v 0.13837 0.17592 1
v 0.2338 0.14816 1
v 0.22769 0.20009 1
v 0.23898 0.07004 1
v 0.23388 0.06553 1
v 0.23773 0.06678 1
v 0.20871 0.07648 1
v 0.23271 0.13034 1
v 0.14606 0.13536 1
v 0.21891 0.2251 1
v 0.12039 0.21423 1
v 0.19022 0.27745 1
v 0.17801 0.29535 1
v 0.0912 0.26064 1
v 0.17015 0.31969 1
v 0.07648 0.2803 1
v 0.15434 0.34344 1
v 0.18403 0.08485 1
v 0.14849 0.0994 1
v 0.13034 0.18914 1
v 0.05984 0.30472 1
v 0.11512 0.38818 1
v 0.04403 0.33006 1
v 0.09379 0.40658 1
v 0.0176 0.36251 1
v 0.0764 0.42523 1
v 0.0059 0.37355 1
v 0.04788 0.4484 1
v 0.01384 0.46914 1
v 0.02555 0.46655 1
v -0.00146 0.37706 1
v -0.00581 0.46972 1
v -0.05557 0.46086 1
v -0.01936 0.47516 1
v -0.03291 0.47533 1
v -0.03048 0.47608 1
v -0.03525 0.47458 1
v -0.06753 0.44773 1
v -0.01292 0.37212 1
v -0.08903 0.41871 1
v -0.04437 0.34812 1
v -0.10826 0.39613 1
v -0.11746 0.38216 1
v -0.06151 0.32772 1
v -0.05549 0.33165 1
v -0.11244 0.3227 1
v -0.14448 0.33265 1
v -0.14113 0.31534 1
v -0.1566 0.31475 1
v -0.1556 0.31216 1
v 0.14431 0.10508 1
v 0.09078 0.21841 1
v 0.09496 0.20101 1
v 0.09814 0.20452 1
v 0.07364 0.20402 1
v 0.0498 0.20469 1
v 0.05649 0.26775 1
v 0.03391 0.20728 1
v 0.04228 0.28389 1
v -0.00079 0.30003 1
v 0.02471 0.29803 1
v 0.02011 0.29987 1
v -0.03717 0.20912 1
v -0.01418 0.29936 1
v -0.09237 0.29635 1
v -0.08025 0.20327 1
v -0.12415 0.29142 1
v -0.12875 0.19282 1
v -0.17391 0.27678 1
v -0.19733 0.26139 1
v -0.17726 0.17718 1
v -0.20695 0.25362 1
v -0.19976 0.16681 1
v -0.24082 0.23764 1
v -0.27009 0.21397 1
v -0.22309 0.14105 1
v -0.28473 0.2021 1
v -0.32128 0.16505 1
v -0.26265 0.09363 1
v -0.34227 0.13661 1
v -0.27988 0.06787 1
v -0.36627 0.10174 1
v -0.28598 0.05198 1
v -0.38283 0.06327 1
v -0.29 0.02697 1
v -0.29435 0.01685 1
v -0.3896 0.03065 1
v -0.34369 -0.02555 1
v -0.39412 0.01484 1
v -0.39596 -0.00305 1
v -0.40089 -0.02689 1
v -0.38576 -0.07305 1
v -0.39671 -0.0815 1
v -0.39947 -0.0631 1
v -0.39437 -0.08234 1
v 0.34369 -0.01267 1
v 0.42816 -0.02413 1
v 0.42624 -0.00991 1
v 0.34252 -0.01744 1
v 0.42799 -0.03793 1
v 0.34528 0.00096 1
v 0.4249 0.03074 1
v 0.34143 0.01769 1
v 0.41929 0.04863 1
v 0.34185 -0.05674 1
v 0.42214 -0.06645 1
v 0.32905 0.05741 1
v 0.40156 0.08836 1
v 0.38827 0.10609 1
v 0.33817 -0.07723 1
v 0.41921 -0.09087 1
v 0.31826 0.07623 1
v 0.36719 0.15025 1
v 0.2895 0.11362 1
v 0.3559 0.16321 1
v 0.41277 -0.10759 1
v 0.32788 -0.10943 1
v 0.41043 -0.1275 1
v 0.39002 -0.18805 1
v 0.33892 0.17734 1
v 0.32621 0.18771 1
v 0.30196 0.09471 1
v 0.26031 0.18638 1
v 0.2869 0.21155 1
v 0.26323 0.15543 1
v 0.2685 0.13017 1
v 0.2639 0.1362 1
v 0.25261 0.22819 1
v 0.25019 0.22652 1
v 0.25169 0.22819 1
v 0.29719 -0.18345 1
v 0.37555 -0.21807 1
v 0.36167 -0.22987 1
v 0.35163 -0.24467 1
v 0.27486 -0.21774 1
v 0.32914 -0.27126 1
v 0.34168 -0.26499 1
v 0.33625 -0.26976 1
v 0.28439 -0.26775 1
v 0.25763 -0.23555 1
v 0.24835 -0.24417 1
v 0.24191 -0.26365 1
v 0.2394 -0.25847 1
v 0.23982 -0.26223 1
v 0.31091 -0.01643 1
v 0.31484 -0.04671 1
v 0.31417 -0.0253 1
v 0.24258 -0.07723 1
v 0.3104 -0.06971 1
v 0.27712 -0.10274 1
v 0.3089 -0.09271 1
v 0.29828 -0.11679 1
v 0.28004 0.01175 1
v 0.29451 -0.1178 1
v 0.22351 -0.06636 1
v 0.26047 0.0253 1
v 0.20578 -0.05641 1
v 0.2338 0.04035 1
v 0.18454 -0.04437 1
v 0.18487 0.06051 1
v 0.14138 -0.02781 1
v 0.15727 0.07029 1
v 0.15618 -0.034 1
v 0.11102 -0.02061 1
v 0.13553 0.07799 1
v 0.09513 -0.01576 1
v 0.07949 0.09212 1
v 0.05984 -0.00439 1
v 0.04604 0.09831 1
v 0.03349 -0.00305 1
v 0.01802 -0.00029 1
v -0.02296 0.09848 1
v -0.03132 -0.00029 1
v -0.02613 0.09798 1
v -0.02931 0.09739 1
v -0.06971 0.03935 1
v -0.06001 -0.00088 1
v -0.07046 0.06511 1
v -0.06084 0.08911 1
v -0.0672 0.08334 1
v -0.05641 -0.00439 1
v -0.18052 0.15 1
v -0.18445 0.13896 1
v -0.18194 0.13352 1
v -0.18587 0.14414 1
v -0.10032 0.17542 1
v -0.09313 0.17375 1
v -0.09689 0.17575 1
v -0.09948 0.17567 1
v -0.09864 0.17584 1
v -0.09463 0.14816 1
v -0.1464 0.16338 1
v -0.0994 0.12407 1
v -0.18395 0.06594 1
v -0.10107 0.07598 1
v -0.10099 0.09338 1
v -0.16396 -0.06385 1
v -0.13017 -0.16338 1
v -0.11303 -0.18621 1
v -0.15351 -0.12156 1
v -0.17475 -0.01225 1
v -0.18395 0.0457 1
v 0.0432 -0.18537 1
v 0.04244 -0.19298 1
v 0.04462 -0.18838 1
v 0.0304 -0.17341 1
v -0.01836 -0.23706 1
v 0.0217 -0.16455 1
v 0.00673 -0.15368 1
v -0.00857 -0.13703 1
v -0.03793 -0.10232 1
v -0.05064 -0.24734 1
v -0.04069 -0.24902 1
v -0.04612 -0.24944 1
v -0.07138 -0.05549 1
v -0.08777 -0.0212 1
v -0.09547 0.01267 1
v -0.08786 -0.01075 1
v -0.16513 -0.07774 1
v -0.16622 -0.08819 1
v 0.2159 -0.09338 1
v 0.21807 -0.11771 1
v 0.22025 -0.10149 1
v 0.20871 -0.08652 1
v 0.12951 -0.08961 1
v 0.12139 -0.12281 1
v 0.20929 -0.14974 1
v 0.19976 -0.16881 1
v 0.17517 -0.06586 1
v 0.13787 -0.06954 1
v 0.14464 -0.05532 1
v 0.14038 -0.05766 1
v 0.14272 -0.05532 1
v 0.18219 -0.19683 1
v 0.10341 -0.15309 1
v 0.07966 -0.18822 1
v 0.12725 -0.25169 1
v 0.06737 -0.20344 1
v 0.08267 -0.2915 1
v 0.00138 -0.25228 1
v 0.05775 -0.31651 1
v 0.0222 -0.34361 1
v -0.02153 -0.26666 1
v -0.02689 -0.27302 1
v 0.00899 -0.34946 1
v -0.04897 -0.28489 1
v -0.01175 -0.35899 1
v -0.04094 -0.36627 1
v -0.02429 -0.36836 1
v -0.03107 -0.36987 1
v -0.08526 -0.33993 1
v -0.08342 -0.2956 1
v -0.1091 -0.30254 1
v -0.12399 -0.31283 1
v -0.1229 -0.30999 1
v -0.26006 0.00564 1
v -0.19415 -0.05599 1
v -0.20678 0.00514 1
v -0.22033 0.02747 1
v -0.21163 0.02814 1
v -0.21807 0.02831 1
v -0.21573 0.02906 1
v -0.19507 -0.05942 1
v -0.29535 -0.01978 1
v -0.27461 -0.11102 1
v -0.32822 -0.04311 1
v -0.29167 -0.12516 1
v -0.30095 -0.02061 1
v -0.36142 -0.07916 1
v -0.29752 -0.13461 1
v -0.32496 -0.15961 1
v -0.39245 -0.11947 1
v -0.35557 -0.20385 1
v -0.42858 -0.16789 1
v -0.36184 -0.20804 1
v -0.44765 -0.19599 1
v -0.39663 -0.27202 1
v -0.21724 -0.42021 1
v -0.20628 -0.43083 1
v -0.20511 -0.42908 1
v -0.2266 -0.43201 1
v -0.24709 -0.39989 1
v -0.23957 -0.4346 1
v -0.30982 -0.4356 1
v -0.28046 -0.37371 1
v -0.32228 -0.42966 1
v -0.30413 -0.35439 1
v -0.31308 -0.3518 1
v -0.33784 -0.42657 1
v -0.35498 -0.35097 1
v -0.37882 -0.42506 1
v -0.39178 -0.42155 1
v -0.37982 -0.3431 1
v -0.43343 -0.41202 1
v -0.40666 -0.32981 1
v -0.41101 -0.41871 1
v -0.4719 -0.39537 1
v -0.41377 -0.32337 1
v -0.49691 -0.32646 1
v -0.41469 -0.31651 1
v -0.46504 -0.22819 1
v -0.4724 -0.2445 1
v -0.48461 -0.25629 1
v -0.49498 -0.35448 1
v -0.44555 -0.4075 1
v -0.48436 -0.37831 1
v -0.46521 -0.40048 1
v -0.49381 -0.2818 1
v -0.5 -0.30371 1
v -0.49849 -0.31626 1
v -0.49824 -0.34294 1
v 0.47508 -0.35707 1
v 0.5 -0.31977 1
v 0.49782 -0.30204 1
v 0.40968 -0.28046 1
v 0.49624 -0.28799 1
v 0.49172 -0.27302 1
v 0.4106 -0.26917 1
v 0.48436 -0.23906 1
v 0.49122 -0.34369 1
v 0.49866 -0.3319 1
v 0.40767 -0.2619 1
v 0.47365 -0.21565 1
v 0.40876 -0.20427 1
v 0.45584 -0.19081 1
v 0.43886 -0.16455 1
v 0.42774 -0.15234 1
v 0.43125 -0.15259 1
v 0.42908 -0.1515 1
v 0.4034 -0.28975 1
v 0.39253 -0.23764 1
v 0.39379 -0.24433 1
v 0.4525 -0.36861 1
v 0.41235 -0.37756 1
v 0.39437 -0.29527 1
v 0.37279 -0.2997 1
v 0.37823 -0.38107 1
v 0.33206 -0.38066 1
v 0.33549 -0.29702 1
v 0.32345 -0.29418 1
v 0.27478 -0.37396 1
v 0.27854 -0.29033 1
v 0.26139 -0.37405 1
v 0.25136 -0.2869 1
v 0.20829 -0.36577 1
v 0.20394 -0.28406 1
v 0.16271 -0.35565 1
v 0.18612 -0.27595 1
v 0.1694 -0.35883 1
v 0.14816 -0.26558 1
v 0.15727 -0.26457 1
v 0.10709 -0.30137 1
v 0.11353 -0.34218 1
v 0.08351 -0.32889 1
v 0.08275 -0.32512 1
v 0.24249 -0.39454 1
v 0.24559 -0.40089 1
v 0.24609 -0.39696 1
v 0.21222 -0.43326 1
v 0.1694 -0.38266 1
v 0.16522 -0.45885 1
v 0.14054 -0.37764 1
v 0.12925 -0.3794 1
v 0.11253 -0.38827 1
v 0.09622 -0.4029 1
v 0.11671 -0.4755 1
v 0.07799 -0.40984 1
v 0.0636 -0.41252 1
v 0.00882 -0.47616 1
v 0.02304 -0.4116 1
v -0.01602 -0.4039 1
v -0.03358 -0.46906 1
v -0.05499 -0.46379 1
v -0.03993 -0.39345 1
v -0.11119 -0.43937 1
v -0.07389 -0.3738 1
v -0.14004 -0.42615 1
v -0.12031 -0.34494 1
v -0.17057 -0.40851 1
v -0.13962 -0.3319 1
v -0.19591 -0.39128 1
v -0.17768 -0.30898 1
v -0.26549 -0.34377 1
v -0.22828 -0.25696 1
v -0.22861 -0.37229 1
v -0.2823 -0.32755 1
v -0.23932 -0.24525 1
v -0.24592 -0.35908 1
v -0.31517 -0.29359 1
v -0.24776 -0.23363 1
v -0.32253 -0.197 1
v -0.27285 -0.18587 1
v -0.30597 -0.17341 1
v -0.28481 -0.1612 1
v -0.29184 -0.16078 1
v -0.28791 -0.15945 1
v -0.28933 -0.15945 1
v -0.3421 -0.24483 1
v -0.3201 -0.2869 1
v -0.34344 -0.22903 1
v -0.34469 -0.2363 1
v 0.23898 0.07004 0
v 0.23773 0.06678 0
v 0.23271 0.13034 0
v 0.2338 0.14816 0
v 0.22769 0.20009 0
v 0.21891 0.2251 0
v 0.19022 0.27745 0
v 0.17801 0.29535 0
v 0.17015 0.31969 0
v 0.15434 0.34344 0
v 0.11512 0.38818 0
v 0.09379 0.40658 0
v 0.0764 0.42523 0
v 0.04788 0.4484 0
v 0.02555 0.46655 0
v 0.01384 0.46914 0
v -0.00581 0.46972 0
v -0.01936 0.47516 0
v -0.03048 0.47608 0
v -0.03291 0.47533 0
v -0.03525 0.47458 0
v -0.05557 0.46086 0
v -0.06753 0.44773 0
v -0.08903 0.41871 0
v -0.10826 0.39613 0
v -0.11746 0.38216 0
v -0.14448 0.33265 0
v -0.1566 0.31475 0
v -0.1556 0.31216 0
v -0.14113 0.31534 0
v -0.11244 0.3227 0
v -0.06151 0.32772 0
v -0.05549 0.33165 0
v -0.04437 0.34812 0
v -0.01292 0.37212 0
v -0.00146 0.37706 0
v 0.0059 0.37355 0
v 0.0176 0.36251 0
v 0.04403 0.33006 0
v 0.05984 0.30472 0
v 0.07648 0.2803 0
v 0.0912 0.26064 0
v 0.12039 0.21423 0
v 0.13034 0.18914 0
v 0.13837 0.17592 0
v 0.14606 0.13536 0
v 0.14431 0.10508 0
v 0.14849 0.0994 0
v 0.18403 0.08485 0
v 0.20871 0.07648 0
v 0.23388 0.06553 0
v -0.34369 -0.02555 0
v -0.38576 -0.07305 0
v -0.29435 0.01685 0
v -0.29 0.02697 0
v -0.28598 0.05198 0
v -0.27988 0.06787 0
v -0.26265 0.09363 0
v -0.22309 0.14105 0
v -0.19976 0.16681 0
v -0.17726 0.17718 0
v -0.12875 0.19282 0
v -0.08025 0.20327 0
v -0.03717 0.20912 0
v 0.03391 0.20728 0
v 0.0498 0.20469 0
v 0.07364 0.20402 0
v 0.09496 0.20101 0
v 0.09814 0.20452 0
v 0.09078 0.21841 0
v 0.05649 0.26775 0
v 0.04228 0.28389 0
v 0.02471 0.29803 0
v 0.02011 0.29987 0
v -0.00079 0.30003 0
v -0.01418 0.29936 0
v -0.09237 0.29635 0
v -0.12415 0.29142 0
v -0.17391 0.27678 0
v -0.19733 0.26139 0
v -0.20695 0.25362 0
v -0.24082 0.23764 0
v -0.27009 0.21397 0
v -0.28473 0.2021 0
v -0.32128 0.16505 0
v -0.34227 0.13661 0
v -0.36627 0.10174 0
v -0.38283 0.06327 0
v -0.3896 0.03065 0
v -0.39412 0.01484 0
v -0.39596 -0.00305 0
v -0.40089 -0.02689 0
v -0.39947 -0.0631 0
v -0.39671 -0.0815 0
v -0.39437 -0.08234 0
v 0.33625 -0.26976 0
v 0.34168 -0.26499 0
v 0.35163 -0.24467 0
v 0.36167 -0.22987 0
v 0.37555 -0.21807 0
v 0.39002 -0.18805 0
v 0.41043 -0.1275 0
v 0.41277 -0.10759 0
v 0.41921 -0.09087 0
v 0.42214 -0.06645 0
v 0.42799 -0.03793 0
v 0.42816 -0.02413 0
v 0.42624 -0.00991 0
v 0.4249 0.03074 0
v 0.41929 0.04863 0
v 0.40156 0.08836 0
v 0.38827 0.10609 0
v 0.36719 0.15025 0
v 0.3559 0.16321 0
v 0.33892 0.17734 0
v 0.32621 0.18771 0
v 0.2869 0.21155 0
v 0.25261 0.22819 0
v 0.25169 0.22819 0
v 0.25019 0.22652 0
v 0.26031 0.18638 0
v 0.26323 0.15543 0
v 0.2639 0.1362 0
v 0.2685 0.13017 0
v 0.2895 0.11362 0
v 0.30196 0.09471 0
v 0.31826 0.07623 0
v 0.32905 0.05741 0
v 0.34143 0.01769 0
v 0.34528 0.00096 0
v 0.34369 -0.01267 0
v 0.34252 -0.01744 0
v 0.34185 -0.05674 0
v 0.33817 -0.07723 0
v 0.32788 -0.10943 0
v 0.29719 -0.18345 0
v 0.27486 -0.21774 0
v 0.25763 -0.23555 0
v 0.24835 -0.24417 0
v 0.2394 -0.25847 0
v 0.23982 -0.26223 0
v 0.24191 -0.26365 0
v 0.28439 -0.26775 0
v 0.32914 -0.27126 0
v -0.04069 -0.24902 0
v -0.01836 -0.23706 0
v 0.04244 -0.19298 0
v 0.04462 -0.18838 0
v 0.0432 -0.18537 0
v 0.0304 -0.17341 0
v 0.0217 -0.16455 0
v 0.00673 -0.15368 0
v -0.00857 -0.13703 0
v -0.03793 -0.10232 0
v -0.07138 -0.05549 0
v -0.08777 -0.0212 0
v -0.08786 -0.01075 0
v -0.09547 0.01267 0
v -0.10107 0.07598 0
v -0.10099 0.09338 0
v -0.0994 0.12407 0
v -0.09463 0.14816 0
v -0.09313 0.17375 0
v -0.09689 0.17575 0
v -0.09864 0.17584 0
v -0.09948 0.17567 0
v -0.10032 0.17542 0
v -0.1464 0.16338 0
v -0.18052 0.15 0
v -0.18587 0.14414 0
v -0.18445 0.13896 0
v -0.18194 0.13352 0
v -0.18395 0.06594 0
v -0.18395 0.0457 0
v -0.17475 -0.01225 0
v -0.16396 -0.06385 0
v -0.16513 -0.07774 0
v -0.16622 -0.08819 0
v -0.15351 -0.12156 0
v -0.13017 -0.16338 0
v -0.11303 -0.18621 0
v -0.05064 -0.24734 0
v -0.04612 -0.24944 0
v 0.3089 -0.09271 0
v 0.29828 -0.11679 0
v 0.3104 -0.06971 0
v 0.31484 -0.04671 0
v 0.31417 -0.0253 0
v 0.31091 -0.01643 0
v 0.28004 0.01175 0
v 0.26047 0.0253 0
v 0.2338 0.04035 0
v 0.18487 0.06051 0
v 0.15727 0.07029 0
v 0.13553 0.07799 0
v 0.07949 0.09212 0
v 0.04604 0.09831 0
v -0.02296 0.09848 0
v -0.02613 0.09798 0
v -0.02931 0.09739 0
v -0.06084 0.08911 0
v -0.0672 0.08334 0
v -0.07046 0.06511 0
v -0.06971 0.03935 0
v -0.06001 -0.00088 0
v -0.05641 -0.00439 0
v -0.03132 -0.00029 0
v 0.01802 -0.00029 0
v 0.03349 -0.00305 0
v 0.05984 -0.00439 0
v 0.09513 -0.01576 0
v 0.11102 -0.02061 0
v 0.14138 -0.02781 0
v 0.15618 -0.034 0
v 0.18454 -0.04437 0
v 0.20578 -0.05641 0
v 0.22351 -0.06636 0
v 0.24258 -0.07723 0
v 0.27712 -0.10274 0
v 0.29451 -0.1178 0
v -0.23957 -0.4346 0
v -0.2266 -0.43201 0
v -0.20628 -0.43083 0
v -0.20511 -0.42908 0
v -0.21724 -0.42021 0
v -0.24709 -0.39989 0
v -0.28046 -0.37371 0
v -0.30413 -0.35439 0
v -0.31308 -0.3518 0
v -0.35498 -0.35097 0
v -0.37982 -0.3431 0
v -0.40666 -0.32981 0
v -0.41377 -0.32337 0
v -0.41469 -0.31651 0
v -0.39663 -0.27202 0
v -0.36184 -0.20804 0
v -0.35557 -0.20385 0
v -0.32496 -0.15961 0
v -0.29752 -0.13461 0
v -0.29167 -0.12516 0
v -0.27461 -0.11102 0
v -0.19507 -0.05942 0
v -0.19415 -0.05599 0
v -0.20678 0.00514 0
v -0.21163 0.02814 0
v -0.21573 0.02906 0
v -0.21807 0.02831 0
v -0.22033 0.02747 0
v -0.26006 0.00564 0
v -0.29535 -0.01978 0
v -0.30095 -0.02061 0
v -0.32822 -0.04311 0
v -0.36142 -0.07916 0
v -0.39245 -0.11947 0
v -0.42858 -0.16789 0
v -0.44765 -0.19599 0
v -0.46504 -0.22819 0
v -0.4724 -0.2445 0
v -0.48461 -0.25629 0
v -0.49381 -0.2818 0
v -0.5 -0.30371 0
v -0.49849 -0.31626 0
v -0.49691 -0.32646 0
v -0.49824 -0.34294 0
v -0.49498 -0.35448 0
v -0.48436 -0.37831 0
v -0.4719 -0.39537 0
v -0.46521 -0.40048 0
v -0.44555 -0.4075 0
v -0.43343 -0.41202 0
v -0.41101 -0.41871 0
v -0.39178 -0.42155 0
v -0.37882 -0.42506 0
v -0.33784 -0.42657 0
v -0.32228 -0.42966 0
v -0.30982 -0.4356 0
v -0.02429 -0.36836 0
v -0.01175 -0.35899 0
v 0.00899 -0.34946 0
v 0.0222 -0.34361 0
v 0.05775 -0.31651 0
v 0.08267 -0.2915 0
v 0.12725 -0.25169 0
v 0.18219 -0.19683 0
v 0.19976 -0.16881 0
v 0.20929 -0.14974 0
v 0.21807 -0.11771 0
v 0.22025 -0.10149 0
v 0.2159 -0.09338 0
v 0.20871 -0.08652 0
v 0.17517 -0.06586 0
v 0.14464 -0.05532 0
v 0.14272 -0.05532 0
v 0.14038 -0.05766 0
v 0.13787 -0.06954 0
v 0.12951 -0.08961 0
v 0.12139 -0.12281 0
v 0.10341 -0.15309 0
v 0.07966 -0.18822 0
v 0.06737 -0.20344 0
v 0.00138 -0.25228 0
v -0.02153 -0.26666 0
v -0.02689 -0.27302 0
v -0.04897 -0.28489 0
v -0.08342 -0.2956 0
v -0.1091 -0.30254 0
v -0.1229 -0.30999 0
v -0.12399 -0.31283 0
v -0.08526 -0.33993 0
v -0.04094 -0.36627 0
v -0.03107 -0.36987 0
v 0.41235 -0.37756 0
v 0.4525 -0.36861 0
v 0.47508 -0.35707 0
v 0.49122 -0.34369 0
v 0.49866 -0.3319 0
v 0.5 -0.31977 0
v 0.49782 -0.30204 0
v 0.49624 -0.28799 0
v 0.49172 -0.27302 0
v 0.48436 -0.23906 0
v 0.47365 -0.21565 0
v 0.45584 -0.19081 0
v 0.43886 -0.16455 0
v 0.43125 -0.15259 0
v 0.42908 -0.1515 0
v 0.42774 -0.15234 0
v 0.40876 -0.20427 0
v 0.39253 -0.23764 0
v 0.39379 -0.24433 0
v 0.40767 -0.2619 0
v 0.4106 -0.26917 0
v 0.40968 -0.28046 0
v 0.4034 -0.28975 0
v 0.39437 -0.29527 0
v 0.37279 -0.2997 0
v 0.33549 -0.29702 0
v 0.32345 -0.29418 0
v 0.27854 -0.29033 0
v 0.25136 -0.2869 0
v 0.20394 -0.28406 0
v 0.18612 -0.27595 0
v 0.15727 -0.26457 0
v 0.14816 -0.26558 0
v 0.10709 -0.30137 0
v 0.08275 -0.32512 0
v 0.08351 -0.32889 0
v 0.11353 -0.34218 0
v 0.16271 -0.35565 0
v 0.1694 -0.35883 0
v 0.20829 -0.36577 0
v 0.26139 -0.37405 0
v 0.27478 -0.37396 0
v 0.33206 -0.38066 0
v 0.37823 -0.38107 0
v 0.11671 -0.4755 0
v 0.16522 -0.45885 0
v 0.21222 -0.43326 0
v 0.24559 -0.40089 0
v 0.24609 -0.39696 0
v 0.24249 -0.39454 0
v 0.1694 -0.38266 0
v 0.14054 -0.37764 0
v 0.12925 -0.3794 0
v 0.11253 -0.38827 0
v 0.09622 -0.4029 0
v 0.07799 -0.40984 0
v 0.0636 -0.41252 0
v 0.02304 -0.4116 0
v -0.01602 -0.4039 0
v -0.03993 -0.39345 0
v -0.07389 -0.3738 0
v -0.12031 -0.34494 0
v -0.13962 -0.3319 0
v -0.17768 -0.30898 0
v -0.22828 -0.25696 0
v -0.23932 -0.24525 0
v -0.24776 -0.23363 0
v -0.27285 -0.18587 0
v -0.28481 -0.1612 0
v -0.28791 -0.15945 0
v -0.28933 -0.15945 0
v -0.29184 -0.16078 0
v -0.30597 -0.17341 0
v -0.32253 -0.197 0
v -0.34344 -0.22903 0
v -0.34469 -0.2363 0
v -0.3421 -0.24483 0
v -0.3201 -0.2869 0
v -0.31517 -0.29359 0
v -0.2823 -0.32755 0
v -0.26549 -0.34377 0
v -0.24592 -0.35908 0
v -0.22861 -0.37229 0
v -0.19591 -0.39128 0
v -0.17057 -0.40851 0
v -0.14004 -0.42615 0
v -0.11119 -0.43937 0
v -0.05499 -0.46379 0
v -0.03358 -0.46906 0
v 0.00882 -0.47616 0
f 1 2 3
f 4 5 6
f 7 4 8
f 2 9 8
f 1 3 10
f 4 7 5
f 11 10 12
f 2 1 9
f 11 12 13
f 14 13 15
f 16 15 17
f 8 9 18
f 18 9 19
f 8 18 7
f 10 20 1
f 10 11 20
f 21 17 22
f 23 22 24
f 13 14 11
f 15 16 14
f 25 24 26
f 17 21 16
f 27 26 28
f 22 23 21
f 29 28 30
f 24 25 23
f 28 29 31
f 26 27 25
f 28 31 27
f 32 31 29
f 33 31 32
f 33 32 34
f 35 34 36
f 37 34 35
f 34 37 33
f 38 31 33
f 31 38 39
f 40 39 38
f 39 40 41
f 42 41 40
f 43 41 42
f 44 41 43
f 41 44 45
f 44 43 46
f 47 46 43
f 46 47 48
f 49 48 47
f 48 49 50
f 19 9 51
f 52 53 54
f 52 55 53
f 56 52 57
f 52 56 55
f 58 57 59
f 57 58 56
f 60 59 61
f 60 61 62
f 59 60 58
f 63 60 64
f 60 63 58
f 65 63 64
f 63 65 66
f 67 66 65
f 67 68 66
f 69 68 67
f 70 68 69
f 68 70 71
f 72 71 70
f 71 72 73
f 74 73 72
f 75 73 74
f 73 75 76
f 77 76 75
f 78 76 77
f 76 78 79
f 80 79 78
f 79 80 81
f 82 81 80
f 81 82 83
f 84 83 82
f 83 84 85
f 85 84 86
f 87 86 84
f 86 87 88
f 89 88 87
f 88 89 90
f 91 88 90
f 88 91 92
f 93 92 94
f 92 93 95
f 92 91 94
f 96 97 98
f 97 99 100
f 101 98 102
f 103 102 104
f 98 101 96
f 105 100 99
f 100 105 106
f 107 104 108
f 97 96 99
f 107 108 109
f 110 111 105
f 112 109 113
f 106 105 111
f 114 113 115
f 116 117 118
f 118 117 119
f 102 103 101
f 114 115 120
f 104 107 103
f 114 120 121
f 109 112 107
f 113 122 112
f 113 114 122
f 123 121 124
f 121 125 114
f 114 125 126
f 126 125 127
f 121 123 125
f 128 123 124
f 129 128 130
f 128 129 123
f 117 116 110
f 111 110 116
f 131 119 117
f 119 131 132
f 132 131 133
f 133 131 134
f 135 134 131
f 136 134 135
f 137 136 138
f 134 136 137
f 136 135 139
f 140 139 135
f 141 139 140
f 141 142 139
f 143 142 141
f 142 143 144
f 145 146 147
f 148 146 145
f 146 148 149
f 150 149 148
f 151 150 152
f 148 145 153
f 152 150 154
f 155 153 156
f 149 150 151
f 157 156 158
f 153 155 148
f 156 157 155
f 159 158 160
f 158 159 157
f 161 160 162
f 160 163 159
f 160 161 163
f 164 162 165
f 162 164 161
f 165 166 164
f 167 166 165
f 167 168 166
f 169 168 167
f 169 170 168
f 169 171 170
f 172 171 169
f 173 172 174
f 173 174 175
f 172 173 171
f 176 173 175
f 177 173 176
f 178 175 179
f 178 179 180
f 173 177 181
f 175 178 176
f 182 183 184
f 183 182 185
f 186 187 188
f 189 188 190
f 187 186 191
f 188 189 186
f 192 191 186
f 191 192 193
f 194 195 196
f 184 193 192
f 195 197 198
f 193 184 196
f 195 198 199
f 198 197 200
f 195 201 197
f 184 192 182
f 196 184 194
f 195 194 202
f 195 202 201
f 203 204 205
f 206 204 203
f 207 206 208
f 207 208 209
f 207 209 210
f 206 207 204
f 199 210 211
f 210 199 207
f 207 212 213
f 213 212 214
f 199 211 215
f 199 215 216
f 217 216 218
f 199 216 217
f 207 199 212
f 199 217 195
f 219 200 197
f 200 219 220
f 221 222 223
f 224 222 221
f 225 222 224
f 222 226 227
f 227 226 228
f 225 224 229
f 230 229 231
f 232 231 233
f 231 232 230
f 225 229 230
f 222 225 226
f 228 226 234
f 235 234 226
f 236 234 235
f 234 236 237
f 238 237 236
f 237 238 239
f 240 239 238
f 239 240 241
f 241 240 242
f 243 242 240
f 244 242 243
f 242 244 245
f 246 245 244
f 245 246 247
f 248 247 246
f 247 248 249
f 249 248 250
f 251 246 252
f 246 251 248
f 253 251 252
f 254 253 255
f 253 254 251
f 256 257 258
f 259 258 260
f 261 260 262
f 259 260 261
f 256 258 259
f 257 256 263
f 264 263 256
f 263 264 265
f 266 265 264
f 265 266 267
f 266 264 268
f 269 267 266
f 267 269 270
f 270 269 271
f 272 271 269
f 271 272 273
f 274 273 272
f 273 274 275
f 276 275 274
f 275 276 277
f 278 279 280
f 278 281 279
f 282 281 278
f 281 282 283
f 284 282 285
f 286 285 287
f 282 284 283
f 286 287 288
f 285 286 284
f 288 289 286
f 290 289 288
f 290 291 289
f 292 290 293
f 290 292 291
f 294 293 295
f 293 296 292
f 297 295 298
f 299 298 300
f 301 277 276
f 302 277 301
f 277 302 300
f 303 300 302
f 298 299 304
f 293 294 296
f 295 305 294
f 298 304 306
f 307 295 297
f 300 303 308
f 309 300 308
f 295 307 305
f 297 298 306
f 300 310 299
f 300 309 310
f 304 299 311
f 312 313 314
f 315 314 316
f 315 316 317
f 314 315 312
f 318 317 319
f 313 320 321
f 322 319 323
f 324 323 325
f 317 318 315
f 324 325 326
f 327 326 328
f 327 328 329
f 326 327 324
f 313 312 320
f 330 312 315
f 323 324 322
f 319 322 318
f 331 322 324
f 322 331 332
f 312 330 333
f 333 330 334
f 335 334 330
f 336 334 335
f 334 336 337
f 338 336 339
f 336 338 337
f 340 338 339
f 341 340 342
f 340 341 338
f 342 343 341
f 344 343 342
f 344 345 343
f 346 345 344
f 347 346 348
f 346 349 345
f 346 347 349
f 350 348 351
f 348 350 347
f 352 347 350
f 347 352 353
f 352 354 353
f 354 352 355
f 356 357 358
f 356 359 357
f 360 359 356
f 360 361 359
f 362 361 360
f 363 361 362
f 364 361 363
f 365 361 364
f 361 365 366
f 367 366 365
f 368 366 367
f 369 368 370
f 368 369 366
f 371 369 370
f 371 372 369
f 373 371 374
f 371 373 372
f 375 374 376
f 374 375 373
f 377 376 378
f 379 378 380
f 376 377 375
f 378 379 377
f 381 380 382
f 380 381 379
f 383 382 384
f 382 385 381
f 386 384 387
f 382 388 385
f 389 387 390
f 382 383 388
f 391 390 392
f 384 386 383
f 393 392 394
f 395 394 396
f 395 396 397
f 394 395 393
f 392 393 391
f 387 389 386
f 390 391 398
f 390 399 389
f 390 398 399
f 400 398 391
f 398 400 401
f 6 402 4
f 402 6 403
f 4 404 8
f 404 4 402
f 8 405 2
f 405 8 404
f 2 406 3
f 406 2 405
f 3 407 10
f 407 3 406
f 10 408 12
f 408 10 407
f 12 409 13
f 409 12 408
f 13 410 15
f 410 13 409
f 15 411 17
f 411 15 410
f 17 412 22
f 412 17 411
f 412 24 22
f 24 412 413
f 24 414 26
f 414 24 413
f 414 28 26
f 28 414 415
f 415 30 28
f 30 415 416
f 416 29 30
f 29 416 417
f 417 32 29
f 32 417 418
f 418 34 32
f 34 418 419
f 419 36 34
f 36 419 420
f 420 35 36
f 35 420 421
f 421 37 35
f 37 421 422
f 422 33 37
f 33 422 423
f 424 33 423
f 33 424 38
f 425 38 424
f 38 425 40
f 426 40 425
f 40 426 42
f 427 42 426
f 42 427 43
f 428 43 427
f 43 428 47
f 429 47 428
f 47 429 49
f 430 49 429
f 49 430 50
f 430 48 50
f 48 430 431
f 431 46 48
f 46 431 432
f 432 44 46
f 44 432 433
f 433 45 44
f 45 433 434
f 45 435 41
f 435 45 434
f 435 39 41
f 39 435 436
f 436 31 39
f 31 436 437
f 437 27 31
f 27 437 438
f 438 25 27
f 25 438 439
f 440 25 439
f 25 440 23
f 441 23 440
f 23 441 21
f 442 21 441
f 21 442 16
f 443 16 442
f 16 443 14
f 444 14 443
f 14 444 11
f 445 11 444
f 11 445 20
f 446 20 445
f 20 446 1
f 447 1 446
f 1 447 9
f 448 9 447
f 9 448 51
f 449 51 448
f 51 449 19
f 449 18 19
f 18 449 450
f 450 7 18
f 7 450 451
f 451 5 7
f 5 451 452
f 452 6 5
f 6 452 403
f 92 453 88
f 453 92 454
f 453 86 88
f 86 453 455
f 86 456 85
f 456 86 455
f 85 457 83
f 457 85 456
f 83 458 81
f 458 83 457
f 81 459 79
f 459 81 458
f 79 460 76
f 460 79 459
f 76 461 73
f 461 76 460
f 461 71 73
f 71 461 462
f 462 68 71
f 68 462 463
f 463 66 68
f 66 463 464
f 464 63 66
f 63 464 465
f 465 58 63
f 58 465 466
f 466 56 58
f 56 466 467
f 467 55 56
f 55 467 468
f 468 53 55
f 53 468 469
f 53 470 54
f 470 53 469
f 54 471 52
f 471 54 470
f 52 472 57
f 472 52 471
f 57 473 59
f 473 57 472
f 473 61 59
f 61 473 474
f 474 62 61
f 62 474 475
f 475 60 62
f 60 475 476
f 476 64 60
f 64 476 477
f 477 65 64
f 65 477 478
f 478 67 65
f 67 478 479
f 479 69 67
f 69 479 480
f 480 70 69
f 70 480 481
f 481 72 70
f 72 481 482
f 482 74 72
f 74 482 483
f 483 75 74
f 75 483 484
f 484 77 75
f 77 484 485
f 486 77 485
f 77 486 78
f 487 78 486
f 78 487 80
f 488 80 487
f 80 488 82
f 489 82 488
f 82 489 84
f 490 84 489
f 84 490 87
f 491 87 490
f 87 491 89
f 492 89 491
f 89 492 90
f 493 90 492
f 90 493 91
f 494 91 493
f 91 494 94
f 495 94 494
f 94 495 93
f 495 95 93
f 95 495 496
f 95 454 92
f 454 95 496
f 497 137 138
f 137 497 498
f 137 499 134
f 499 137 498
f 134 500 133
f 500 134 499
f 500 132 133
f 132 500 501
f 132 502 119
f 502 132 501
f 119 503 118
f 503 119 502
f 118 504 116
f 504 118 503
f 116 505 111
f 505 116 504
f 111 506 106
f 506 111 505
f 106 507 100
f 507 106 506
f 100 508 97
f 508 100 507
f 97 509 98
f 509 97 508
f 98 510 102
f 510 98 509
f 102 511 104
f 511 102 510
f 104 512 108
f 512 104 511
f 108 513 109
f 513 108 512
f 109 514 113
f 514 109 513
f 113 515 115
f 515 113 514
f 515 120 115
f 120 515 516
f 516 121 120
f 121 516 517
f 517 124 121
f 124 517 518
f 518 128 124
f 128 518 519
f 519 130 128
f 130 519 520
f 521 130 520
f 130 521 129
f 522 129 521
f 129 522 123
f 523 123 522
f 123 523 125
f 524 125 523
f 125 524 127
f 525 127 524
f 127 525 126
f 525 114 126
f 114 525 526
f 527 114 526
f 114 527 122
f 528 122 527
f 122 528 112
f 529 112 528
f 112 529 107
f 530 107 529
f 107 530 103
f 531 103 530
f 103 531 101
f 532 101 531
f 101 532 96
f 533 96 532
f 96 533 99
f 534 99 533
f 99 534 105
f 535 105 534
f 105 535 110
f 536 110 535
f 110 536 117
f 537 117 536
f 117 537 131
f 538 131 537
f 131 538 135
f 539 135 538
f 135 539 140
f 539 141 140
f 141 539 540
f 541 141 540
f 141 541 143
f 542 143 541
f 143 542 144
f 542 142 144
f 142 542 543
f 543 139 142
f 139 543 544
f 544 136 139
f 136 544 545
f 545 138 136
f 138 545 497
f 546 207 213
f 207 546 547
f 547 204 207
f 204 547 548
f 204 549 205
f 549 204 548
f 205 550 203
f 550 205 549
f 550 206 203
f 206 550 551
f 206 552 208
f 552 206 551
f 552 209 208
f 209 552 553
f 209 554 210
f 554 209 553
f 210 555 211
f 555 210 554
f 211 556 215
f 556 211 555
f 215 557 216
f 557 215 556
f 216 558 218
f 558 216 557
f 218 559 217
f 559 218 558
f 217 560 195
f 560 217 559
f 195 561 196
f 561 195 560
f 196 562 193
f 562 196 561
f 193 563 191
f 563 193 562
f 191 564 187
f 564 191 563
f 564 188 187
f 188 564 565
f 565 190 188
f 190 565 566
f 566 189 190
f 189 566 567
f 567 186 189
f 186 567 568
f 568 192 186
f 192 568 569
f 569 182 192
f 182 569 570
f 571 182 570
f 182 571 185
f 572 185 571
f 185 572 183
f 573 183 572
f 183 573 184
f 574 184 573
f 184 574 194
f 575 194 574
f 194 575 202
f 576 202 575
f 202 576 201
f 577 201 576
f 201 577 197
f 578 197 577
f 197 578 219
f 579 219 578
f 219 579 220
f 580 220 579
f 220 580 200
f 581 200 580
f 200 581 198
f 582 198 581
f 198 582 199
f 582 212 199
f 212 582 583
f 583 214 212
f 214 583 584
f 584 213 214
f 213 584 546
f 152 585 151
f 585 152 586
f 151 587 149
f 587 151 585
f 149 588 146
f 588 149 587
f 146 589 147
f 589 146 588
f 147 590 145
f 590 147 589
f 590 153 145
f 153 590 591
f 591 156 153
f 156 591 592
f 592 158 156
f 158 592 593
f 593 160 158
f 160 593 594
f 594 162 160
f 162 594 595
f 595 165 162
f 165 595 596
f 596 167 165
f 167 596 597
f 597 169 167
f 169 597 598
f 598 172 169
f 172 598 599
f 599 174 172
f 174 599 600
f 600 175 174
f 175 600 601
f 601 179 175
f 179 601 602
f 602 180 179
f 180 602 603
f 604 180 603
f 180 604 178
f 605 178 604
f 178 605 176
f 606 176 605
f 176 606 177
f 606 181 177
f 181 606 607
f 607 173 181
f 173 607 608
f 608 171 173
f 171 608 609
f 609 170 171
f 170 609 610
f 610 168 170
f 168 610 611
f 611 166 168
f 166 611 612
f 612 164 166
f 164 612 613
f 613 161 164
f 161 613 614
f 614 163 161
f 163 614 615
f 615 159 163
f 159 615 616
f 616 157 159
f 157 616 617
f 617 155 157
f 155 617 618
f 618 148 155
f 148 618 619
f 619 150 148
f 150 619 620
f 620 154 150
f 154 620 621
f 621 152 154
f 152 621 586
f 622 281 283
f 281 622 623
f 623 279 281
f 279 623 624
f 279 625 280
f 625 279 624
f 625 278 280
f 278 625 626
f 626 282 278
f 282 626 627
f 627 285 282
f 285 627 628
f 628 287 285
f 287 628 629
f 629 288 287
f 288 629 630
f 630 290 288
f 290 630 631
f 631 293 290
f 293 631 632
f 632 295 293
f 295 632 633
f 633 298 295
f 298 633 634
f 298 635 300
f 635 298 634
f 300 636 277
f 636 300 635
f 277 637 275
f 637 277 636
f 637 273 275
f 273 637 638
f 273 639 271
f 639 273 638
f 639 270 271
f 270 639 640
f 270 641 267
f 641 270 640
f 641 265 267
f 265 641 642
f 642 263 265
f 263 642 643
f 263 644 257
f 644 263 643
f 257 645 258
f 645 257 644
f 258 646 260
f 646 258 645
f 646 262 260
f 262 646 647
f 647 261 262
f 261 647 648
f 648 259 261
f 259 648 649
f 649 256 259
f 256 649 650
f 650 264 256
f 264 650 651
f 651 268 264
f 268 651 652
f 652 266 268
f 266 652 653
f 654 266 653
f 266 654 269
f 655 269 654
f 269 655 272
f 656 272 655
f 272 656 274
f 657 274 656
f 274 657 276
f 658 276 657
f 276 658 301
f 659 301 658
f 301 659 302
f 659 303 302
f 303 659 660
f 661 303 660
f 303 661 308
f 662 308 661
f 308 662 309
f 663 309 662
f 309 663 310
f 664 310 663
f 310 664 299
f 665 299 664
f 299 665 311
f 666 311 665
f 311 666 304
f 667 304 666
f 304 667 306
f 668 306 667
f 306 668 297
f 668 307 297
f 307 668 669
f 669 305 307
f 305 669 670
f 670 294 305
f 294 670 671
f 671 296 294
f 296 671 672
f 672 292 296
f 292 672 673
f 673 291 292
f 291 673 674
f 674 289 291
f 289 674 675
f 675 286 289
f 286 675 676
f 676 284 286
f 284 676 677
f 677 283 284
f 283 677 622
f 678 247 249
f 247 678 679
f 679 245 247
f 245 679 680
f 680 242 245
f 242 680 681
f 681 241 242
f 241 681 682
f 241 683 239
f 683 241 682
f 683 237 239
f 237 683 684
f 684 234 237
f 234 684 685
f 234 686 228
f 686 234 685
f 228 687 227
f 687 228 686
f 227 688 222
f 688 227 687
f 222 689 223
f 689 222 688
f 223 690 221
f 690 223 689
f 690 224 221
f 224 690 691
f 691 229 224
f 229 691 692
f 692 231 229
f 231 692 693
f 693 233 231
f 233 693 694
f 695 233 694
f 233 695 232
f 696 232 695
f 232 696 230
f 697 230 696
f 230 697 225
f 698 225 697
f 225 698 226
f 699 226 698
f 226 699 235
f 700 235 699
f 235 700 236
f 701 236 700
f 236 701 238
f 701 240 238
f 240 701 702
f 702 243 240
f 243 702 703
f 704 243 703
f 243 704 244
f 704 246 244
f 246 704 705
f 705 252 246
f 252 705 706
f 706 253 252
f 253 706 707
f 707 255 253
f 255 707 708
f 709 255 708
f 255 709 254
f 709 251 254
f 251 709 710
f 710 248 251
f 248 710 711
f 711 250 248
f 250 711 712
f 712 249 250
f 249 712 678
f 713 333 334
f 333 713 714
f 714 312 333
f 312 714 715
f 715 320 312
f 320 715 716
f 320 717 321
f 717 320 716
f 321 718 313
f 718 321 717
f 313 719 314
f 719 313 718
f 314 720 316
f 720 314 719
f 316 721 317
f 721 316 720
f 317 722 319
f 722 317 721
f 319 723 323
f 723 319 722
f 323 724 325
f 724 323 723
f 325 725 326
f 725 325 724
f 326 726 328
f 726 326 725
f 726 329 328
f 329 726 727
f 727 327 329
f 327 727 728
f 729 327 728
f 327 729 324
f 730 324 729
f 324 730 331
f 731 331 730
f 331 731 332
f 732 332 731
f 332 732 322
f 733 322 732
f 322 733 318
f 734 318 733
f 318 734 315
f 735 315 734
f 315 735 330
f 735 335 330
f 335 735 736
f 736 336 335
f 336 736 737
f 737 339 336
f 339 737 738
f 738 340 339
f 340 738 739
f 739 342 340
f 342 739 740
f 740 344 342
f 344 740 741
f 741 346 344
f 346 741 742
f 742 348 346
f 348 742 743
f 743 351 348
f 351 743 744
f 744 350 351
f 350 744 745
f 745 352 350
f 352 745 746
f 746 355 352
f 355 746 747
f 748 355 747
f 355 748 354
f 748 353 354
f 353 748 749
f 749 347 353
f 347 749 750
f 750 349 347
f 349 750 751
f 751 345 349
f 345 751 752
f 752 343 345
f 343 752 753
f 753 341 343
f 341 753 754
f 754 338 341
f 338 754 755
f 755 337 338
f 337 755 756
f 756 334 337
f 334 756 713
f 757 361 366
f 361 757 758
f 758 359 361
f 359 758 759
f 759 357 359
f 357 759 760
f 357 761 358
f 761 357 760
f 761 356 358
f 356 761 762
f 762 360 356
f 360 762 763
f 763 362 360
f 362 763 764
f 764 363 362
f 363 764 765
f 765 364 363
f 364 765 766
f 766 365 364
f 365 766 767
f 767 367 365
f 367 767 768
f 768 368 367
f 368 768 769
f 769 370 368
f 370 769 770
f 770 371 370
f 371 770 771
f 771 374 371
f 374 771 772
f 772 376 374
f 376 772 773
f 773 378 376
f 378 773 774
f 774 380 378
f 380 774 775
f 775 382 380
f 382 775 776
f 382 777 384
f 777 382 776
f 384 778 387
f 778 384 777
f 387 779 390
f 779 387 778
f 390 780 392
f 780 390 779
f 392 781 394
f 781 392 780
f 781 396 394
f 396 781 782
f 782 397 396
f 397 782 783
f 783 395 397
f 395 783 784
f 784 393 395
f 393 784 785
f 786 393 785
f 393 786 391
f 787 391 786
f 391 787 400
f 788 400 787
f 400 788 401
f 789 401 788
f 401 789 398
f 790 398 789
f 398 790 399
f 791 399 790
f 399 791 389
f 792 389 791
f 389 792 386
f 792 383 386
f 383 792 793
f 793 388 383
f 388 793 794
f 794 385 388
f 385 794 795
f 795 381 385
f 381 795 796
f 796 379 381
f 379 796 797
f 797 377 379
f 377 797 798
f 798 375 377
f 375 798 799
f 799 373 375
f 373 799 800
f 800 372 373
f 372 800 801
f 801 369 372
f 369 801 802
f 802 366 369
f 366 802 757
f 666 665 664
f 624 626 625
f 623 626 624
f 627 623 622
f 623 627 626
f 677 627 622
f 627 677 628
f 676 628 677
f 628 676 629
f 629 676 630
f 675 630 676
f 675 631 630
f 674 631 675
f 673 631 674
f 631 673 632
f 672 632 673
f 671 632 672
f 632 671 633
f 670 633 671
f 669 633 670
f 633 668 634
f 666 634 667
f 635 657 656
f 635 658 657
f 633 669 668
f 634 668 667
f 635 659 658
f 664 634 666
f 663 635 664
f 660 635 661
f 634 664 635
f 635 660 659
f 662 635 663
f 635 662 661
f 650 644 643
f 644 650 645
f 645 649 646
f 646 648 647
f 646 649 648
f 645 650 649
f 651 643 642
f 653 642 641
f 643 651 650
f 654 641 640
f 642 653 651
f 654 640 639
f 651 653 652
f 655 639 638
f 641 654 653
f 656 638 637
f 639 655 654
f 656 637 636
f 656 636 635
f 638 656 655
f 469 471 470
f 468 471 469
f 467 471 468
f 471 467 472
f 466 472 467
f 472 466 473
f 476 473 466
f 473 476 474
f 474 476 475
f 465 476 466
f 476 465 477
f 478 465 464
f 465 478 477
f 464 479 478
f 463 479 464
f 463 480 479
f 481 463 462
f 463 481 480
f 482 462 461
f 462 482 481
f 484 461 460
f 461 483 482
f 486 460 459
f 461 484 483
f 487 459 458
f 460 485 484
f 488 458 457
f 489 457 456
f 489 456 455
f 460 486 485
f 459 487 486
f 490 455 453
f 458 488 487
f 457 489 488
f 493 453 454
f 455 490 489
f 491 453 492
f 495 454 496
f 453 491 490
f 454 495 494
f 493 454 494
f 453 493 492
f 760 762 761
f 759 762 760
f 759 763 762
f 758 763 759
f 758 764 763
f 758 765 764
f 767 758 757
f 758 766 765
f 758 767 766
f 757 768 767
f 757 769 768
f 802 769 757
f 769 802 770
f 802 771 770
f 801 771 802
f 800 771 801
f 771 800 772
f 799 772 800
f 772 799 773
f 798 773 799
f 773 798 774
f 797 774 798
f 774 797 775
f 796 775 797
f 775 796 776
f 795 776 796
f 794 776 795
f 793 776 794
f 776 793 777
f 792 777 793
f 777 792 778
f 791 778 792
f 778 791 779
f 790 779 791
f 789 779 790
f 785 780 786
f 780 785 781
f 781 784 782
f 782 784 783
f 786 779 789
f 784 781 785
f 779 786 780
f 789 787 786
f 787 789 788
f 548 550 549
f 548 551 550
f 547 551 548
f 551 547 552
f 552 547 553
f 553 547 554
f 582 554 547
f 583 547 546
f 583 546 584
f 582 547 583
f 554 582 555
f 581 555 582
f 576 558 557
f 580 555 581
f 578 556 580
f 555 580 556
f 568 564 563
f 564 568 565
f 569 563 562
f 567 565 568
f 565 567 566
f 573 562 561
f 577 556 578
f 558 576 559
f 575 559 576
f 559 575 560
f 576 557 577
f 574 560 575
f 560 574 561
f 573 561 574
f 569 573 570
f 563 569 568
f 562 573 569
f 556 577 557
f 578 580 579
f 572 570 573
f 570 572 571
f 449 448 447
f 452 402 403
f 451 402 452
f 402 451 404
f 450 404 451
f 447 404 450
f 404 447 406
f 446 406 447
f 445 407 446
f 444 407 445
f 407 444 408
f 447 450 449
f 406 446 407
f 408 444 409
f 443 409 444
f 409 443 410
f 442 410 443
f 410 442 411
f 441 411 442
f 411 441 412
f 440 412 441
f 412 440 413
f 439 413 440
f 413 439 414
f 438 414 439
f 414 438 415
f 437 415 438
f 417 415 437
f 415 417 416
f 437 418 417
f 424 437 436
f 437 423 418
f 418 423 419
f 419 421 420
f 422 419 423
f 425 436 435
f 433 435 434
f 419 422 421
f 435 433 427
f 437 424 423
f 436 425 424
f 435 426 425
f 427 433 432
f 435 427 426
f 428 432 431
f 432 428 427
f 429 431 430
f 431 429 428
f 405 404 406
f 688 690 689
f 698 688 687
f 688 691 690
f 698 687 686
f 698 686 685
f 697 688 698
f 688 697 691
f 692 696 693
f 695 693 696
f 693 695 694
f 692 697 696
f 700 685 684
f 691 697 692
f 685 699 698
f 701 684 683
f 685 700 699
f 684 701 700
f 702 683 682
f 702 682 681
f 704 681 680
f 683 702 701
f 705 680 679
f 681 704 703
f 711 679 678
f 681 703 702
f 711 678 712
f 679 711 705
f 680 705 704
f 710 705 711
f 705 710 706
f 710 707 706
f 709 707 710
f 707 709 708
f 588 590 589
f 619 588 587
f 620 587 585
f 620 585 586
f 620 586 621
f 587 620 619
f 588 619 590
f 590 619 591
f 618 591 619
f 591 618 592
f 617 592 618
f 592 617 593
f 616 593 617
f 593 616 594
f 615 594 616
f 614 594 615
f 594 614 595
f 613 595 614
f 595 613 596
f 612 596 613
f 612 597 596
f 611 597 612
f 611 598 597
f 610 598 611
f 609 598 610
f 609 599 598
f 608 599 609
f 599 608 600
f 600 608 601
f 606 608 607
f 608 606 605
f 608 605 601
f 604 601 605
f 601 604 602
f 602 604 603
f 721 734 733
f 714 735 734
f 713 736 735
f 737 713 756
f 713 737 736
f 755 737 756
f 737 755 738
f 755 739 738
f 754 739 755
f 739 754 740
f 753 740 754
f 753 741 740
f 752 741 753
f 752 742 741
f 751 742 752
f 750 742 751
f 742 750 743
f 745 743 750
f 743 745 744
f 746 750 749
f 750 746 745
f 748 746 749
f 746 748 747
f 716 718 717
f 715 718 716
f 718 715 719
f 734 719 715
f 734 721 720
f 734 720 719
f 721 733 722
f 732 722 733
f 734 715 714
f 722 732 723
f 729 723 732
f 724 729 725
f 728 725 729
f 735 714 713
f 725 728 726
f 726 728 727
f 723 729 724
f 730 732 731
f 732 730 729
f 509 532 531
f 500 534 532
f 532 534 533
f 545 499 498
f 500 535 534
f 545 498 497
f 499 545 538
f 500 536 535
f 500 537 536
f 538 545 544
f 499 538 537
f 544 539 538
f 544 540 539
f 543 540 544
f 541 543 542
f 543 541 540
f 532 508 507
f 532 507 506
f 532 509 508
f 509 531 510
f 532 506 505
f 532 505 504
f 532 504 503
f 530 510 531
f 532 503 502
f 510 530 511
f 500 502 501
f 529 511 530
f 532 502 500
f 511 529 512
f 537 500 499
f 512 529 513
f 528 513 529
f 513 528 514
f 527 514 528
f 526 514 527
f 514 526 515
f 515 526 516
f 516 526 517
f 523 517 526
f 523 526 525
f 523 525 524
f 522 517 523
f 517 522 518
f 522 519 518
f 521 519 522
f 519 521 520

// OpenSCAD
module guitarPick_1()
{
 /* Generated by trace2scad version 20150415
    http://aggregate.org/MAKE/TRACE2SCAD/
    Optimized model has 406/1933 original points
 */
 color([0.5, 0.5, 0.5])
 assign(minx=4154) /* polygon minx=4154 */
 assign(miny=4168) /* polygon miny=4168 */
 assign(maxx=16111) /* polygon maxx=16111 */
 assign(maxy=15555) /* polygon maxy=15555 */
 assign(dx=maxx-minx)
 assign(dy=maxy-miny)
 assign(maxd=((dx>dy)?dx:dy))
 scale([1/maxd, 1/maxd, 1])
 translate([-minx-dx/2, -miny-dy/2, 0])
 linear_extrude(height=1, convexity=406)
 union() {
  union() {
   polygon([[9739,15545],[9711,15536],[9468,15372],[9325,15215],[9068,14868],[8838,14598],[8728,14431],[8405,13839],[8260,13625],[8272,13594],[8445,13632],[8788,13720],[9397,13780],[9469,13827],[9602,14024],[9978,14311],[10115,14370],[10203,14328],[10343,14196],[10659,13808],[10848,13505],[11047,13213],[11223,12978],[11572,12423],[11691,12123],[11787,11965],[11879,11480],[11858,11118],[11908,11050],[12333,10876],[12628,10776],[12929,10645],[12975,10660],[12990,10699],[12915,11420],[12928,11633],[12855,12254],[12750,12553],[12407,13179],[12261,13393],[12167,13684],[11978,13968],[11509,14503],[11254,14723],[11046,14946],[10705,15223],[10438,15440],[10298,15471],[10063,15478],[9901,15543],[9768,15554]], convexity=12);
   polygon([[10043,13445],[9963,13441],[9028,13405],[8648,13346],[8053,13171],[7773,12987],[7658,12894],[7253,12703],[6903,12420],[6728,12278],[6291,11835],[6040,11495],[5753,11078],[5555,10618],[5474,10228],[5420,10039],[5398,9825],[5339,9540],[5356,9107],[5389,8887],[5417,8877],[5520,8988],[6023,9556],[6613,10063],[6665,10184],[6713,10483],[6786,10673],[6992,10981],[7465,11548],[7744,11856],[8013,11980],[8593,12167],[9173,12292],[9688,12362],[10538,12340],[10728,12309],[11013,12301],[11268,12265],[11306,12307],[11218,12473],[10808,13063],[10638,13256],[10428,13425],[10373,13447],[10123,13449]], convexity=8);
   polygon([[13133,12580],[13124,12570],[13245,12090],[13280,11720],[13288,11490],[13343,11418],[13594,11220],[13743,10994],[13938,10773],[14067,10548],[14215,10073],[14261,9873],[14242,9710],[14228,9653],[14220,9183],[14176,8938],[14053,8553],[13686,7668],[13419,7258],[13213,7045],[13102,6942],[12995,6771],[13000,6726],[13025,6709],[13533,6660],[14068,6618],[14153,6636],[14218,6693],[14337,6936],[14457,7113],[14623,7254],[14796,7613],[15040,8337],[15068,8575],[15145,8775],[15180,9067],[15250,9408],[15252,9573],[15229,9743],[15213,10229],[15146,10443],[14934,10918],[14775,11130],[14523,11658],[14388,11813],[14185,11982],[14033,12106],[13563,12391],[13153,12590],[13142,12590]], convexity=8);
   polygon([[8943,11962],[8933,11959],[8382,11815],[7974,11655],[7910,11585],[7927,11523],[7957,11458],[7933,10650],[7933,10408],[8043,9715],[8172,9098],[8158,8932],[8145,8807],[8297,8408],[8576,7908],[8781,7635],[9527,6904],[9581,6879],[9646,6884],[9913,7027],[10640,7554],[10666,7609],[10649,7645],[10496,7788],[10392,7894],[10213,8024],[10030,8223],[9679,8638],[9279,9198],[9083,9608],[9082,9733],[8991,10013],[8924,10770],[8925,10978],[8944,11345],[9001,11633],[9019,11939],[8974,11963],[8953,11964]], convexity=12);
   polygon([[9820,11033],[9782,11026],[9405,10927],[9329,10858],[9290,10640],[9299,10332],[9415,9851],[9458,9809],[9758,9858],[10348,9858],[10533,9825],[10848,9809],[11270,9673],[11460,9615],[11823,9529],[12000,9455],[12339,9331],[12593,9187],[12805,9068],[13033,8938],[13446,8633],[13654,8453],[13699,8465],[13826,8753],[13844,9028],[13897,9303],[13889,9559],[13850,9665],[13481,10002],[13247,10164],[12928,10344],[12343,10585],[12013,10702],[11753,10794],[11083,10963],[10683,11037],[9858,11039]], convexity=8);
   polygon([[7525,10200],[7498,10190],[7023,9929],[6601,9625],[6534,9615],[6208,9346],[5811,8915],[5440,8433],[5008,7854],[4780,7518],[4572,7133],[4484,6938],[4338,6797],[4228,6492],[4154,6230],[4172,6080],[4191,5958],[4175,5761],[4214,5623],[4341,5338],[4490,5134],[4570,5073],[4805,4989],[4950,4935],[5218,4855],[5448,4821],[5603,4779],[6093,4761],[6279,4724],[6428,4653],[7268,4665],[7423,4696],[7666,4710],[7680,4731],[7535,4837],[7178,5080],[6779,5393],[6496,5624],[6389,5655],[5888,5665],[5591,5759],[5270,5918],[5185,5995],[5174,6077],[5390,6609],[5806,7374],[5881,7424],[6247,7953],[6575,8252],[6645,8365],[6849,8534],[7800,9151],[7811,9192],[7660,9923],[7602,10198],[7553,10209]], convexity=10);
   polygon([[11825,9186],[11811,9172],[11781,9030],[11681,8790],[11584,8393],[11369,8031],[11085,7611],[10938,7429],[10149,6845],[9875,6673],[9811,6597],[9547,6455],[9135,6327],[8828,6244],[8663,6155],[8650,6121],[9113,5797],[9643,5482],[9761,5439],[9842,5457],[9992,5569],[10240,5683],[10398,5753],[10823,6077],[11121,6376],[11654,6852],[12311,7508],[12521,7843],[12635,8071],[12740,8454],[12766,8648],[12714,8745],[12628,8827],[12227,9074],[11862,9200],[11839,9200]], convexity=6);
   polygon([[15255,8045],[15247,8040],[15020,7419],[14826,7020],[14841,6940],[15007,6730],[15042,6643],[15031,6508],[14956,6397],[14848,6331],[14590,6278],[14144,6310],[14000,6344],[13463,6390],[13138,6431],[12571,6465],[12358,6562],[12013,6698],[11904,6686],[11413,6258],[11122,5974],[11131,5929],[11490,5770],[12078,5609],[12158,5571],[12623,5488],[13258,5389],[13418,5390],[14103,5310],[14655,5305],[15063,5347],[15543,5454],[15813,5592],[16006,5752],[16095,5893],[16111,6038],[16085,6250],[16066,6418],[16012,6597],[15924,7003],[15796,7283],[15583,7580],[15380,7894],[15289,8037],[15263,8050]], convexity=12);
   polygon([[6658,7947],[6643,7939],[6474,7788],[6276,7506],[6026,7123],[6011,7036],[6042,6934],[6305,6431],[6364,6351],[6757,5945],[6958,5751],[7192,5568],[7399,5410],[7790,5183],[8093,4977],[8458,4766],[8803,4608],[9475,4316],[9731,4253],[10238,4168],[11528,4176],[12108,4375],[12670,4681],[13069,5068],[13075,5115],[13032,5144],[12158,5286],[11813,5346],[11678,5325],[11478,5219],[11283,5044],[11065,4961],[10893,4929],[10408,4940],[9941,5032],[9655,5157],[9249,5392],[8694,5737],[8463,5893],[8008,6167],[7403,6789],[7271,6929],[7170,7068],[6870,7639],[6727,7934],[6690,7955],[6673,7955]], convexity=8);
  }
 }
}

module guitarPick()
{
 /* all layers combined, scaled to within a 1mm cube */
 scale([1, 1, 1/1])
 difference() {
  union() {
   scale([1,1,2]) translate([0,0,-0.5]) guitarPick_1();
  }
  translate([0,0,-2]) cube([2,2,4],center=true);
 }
}
guitarPick();
